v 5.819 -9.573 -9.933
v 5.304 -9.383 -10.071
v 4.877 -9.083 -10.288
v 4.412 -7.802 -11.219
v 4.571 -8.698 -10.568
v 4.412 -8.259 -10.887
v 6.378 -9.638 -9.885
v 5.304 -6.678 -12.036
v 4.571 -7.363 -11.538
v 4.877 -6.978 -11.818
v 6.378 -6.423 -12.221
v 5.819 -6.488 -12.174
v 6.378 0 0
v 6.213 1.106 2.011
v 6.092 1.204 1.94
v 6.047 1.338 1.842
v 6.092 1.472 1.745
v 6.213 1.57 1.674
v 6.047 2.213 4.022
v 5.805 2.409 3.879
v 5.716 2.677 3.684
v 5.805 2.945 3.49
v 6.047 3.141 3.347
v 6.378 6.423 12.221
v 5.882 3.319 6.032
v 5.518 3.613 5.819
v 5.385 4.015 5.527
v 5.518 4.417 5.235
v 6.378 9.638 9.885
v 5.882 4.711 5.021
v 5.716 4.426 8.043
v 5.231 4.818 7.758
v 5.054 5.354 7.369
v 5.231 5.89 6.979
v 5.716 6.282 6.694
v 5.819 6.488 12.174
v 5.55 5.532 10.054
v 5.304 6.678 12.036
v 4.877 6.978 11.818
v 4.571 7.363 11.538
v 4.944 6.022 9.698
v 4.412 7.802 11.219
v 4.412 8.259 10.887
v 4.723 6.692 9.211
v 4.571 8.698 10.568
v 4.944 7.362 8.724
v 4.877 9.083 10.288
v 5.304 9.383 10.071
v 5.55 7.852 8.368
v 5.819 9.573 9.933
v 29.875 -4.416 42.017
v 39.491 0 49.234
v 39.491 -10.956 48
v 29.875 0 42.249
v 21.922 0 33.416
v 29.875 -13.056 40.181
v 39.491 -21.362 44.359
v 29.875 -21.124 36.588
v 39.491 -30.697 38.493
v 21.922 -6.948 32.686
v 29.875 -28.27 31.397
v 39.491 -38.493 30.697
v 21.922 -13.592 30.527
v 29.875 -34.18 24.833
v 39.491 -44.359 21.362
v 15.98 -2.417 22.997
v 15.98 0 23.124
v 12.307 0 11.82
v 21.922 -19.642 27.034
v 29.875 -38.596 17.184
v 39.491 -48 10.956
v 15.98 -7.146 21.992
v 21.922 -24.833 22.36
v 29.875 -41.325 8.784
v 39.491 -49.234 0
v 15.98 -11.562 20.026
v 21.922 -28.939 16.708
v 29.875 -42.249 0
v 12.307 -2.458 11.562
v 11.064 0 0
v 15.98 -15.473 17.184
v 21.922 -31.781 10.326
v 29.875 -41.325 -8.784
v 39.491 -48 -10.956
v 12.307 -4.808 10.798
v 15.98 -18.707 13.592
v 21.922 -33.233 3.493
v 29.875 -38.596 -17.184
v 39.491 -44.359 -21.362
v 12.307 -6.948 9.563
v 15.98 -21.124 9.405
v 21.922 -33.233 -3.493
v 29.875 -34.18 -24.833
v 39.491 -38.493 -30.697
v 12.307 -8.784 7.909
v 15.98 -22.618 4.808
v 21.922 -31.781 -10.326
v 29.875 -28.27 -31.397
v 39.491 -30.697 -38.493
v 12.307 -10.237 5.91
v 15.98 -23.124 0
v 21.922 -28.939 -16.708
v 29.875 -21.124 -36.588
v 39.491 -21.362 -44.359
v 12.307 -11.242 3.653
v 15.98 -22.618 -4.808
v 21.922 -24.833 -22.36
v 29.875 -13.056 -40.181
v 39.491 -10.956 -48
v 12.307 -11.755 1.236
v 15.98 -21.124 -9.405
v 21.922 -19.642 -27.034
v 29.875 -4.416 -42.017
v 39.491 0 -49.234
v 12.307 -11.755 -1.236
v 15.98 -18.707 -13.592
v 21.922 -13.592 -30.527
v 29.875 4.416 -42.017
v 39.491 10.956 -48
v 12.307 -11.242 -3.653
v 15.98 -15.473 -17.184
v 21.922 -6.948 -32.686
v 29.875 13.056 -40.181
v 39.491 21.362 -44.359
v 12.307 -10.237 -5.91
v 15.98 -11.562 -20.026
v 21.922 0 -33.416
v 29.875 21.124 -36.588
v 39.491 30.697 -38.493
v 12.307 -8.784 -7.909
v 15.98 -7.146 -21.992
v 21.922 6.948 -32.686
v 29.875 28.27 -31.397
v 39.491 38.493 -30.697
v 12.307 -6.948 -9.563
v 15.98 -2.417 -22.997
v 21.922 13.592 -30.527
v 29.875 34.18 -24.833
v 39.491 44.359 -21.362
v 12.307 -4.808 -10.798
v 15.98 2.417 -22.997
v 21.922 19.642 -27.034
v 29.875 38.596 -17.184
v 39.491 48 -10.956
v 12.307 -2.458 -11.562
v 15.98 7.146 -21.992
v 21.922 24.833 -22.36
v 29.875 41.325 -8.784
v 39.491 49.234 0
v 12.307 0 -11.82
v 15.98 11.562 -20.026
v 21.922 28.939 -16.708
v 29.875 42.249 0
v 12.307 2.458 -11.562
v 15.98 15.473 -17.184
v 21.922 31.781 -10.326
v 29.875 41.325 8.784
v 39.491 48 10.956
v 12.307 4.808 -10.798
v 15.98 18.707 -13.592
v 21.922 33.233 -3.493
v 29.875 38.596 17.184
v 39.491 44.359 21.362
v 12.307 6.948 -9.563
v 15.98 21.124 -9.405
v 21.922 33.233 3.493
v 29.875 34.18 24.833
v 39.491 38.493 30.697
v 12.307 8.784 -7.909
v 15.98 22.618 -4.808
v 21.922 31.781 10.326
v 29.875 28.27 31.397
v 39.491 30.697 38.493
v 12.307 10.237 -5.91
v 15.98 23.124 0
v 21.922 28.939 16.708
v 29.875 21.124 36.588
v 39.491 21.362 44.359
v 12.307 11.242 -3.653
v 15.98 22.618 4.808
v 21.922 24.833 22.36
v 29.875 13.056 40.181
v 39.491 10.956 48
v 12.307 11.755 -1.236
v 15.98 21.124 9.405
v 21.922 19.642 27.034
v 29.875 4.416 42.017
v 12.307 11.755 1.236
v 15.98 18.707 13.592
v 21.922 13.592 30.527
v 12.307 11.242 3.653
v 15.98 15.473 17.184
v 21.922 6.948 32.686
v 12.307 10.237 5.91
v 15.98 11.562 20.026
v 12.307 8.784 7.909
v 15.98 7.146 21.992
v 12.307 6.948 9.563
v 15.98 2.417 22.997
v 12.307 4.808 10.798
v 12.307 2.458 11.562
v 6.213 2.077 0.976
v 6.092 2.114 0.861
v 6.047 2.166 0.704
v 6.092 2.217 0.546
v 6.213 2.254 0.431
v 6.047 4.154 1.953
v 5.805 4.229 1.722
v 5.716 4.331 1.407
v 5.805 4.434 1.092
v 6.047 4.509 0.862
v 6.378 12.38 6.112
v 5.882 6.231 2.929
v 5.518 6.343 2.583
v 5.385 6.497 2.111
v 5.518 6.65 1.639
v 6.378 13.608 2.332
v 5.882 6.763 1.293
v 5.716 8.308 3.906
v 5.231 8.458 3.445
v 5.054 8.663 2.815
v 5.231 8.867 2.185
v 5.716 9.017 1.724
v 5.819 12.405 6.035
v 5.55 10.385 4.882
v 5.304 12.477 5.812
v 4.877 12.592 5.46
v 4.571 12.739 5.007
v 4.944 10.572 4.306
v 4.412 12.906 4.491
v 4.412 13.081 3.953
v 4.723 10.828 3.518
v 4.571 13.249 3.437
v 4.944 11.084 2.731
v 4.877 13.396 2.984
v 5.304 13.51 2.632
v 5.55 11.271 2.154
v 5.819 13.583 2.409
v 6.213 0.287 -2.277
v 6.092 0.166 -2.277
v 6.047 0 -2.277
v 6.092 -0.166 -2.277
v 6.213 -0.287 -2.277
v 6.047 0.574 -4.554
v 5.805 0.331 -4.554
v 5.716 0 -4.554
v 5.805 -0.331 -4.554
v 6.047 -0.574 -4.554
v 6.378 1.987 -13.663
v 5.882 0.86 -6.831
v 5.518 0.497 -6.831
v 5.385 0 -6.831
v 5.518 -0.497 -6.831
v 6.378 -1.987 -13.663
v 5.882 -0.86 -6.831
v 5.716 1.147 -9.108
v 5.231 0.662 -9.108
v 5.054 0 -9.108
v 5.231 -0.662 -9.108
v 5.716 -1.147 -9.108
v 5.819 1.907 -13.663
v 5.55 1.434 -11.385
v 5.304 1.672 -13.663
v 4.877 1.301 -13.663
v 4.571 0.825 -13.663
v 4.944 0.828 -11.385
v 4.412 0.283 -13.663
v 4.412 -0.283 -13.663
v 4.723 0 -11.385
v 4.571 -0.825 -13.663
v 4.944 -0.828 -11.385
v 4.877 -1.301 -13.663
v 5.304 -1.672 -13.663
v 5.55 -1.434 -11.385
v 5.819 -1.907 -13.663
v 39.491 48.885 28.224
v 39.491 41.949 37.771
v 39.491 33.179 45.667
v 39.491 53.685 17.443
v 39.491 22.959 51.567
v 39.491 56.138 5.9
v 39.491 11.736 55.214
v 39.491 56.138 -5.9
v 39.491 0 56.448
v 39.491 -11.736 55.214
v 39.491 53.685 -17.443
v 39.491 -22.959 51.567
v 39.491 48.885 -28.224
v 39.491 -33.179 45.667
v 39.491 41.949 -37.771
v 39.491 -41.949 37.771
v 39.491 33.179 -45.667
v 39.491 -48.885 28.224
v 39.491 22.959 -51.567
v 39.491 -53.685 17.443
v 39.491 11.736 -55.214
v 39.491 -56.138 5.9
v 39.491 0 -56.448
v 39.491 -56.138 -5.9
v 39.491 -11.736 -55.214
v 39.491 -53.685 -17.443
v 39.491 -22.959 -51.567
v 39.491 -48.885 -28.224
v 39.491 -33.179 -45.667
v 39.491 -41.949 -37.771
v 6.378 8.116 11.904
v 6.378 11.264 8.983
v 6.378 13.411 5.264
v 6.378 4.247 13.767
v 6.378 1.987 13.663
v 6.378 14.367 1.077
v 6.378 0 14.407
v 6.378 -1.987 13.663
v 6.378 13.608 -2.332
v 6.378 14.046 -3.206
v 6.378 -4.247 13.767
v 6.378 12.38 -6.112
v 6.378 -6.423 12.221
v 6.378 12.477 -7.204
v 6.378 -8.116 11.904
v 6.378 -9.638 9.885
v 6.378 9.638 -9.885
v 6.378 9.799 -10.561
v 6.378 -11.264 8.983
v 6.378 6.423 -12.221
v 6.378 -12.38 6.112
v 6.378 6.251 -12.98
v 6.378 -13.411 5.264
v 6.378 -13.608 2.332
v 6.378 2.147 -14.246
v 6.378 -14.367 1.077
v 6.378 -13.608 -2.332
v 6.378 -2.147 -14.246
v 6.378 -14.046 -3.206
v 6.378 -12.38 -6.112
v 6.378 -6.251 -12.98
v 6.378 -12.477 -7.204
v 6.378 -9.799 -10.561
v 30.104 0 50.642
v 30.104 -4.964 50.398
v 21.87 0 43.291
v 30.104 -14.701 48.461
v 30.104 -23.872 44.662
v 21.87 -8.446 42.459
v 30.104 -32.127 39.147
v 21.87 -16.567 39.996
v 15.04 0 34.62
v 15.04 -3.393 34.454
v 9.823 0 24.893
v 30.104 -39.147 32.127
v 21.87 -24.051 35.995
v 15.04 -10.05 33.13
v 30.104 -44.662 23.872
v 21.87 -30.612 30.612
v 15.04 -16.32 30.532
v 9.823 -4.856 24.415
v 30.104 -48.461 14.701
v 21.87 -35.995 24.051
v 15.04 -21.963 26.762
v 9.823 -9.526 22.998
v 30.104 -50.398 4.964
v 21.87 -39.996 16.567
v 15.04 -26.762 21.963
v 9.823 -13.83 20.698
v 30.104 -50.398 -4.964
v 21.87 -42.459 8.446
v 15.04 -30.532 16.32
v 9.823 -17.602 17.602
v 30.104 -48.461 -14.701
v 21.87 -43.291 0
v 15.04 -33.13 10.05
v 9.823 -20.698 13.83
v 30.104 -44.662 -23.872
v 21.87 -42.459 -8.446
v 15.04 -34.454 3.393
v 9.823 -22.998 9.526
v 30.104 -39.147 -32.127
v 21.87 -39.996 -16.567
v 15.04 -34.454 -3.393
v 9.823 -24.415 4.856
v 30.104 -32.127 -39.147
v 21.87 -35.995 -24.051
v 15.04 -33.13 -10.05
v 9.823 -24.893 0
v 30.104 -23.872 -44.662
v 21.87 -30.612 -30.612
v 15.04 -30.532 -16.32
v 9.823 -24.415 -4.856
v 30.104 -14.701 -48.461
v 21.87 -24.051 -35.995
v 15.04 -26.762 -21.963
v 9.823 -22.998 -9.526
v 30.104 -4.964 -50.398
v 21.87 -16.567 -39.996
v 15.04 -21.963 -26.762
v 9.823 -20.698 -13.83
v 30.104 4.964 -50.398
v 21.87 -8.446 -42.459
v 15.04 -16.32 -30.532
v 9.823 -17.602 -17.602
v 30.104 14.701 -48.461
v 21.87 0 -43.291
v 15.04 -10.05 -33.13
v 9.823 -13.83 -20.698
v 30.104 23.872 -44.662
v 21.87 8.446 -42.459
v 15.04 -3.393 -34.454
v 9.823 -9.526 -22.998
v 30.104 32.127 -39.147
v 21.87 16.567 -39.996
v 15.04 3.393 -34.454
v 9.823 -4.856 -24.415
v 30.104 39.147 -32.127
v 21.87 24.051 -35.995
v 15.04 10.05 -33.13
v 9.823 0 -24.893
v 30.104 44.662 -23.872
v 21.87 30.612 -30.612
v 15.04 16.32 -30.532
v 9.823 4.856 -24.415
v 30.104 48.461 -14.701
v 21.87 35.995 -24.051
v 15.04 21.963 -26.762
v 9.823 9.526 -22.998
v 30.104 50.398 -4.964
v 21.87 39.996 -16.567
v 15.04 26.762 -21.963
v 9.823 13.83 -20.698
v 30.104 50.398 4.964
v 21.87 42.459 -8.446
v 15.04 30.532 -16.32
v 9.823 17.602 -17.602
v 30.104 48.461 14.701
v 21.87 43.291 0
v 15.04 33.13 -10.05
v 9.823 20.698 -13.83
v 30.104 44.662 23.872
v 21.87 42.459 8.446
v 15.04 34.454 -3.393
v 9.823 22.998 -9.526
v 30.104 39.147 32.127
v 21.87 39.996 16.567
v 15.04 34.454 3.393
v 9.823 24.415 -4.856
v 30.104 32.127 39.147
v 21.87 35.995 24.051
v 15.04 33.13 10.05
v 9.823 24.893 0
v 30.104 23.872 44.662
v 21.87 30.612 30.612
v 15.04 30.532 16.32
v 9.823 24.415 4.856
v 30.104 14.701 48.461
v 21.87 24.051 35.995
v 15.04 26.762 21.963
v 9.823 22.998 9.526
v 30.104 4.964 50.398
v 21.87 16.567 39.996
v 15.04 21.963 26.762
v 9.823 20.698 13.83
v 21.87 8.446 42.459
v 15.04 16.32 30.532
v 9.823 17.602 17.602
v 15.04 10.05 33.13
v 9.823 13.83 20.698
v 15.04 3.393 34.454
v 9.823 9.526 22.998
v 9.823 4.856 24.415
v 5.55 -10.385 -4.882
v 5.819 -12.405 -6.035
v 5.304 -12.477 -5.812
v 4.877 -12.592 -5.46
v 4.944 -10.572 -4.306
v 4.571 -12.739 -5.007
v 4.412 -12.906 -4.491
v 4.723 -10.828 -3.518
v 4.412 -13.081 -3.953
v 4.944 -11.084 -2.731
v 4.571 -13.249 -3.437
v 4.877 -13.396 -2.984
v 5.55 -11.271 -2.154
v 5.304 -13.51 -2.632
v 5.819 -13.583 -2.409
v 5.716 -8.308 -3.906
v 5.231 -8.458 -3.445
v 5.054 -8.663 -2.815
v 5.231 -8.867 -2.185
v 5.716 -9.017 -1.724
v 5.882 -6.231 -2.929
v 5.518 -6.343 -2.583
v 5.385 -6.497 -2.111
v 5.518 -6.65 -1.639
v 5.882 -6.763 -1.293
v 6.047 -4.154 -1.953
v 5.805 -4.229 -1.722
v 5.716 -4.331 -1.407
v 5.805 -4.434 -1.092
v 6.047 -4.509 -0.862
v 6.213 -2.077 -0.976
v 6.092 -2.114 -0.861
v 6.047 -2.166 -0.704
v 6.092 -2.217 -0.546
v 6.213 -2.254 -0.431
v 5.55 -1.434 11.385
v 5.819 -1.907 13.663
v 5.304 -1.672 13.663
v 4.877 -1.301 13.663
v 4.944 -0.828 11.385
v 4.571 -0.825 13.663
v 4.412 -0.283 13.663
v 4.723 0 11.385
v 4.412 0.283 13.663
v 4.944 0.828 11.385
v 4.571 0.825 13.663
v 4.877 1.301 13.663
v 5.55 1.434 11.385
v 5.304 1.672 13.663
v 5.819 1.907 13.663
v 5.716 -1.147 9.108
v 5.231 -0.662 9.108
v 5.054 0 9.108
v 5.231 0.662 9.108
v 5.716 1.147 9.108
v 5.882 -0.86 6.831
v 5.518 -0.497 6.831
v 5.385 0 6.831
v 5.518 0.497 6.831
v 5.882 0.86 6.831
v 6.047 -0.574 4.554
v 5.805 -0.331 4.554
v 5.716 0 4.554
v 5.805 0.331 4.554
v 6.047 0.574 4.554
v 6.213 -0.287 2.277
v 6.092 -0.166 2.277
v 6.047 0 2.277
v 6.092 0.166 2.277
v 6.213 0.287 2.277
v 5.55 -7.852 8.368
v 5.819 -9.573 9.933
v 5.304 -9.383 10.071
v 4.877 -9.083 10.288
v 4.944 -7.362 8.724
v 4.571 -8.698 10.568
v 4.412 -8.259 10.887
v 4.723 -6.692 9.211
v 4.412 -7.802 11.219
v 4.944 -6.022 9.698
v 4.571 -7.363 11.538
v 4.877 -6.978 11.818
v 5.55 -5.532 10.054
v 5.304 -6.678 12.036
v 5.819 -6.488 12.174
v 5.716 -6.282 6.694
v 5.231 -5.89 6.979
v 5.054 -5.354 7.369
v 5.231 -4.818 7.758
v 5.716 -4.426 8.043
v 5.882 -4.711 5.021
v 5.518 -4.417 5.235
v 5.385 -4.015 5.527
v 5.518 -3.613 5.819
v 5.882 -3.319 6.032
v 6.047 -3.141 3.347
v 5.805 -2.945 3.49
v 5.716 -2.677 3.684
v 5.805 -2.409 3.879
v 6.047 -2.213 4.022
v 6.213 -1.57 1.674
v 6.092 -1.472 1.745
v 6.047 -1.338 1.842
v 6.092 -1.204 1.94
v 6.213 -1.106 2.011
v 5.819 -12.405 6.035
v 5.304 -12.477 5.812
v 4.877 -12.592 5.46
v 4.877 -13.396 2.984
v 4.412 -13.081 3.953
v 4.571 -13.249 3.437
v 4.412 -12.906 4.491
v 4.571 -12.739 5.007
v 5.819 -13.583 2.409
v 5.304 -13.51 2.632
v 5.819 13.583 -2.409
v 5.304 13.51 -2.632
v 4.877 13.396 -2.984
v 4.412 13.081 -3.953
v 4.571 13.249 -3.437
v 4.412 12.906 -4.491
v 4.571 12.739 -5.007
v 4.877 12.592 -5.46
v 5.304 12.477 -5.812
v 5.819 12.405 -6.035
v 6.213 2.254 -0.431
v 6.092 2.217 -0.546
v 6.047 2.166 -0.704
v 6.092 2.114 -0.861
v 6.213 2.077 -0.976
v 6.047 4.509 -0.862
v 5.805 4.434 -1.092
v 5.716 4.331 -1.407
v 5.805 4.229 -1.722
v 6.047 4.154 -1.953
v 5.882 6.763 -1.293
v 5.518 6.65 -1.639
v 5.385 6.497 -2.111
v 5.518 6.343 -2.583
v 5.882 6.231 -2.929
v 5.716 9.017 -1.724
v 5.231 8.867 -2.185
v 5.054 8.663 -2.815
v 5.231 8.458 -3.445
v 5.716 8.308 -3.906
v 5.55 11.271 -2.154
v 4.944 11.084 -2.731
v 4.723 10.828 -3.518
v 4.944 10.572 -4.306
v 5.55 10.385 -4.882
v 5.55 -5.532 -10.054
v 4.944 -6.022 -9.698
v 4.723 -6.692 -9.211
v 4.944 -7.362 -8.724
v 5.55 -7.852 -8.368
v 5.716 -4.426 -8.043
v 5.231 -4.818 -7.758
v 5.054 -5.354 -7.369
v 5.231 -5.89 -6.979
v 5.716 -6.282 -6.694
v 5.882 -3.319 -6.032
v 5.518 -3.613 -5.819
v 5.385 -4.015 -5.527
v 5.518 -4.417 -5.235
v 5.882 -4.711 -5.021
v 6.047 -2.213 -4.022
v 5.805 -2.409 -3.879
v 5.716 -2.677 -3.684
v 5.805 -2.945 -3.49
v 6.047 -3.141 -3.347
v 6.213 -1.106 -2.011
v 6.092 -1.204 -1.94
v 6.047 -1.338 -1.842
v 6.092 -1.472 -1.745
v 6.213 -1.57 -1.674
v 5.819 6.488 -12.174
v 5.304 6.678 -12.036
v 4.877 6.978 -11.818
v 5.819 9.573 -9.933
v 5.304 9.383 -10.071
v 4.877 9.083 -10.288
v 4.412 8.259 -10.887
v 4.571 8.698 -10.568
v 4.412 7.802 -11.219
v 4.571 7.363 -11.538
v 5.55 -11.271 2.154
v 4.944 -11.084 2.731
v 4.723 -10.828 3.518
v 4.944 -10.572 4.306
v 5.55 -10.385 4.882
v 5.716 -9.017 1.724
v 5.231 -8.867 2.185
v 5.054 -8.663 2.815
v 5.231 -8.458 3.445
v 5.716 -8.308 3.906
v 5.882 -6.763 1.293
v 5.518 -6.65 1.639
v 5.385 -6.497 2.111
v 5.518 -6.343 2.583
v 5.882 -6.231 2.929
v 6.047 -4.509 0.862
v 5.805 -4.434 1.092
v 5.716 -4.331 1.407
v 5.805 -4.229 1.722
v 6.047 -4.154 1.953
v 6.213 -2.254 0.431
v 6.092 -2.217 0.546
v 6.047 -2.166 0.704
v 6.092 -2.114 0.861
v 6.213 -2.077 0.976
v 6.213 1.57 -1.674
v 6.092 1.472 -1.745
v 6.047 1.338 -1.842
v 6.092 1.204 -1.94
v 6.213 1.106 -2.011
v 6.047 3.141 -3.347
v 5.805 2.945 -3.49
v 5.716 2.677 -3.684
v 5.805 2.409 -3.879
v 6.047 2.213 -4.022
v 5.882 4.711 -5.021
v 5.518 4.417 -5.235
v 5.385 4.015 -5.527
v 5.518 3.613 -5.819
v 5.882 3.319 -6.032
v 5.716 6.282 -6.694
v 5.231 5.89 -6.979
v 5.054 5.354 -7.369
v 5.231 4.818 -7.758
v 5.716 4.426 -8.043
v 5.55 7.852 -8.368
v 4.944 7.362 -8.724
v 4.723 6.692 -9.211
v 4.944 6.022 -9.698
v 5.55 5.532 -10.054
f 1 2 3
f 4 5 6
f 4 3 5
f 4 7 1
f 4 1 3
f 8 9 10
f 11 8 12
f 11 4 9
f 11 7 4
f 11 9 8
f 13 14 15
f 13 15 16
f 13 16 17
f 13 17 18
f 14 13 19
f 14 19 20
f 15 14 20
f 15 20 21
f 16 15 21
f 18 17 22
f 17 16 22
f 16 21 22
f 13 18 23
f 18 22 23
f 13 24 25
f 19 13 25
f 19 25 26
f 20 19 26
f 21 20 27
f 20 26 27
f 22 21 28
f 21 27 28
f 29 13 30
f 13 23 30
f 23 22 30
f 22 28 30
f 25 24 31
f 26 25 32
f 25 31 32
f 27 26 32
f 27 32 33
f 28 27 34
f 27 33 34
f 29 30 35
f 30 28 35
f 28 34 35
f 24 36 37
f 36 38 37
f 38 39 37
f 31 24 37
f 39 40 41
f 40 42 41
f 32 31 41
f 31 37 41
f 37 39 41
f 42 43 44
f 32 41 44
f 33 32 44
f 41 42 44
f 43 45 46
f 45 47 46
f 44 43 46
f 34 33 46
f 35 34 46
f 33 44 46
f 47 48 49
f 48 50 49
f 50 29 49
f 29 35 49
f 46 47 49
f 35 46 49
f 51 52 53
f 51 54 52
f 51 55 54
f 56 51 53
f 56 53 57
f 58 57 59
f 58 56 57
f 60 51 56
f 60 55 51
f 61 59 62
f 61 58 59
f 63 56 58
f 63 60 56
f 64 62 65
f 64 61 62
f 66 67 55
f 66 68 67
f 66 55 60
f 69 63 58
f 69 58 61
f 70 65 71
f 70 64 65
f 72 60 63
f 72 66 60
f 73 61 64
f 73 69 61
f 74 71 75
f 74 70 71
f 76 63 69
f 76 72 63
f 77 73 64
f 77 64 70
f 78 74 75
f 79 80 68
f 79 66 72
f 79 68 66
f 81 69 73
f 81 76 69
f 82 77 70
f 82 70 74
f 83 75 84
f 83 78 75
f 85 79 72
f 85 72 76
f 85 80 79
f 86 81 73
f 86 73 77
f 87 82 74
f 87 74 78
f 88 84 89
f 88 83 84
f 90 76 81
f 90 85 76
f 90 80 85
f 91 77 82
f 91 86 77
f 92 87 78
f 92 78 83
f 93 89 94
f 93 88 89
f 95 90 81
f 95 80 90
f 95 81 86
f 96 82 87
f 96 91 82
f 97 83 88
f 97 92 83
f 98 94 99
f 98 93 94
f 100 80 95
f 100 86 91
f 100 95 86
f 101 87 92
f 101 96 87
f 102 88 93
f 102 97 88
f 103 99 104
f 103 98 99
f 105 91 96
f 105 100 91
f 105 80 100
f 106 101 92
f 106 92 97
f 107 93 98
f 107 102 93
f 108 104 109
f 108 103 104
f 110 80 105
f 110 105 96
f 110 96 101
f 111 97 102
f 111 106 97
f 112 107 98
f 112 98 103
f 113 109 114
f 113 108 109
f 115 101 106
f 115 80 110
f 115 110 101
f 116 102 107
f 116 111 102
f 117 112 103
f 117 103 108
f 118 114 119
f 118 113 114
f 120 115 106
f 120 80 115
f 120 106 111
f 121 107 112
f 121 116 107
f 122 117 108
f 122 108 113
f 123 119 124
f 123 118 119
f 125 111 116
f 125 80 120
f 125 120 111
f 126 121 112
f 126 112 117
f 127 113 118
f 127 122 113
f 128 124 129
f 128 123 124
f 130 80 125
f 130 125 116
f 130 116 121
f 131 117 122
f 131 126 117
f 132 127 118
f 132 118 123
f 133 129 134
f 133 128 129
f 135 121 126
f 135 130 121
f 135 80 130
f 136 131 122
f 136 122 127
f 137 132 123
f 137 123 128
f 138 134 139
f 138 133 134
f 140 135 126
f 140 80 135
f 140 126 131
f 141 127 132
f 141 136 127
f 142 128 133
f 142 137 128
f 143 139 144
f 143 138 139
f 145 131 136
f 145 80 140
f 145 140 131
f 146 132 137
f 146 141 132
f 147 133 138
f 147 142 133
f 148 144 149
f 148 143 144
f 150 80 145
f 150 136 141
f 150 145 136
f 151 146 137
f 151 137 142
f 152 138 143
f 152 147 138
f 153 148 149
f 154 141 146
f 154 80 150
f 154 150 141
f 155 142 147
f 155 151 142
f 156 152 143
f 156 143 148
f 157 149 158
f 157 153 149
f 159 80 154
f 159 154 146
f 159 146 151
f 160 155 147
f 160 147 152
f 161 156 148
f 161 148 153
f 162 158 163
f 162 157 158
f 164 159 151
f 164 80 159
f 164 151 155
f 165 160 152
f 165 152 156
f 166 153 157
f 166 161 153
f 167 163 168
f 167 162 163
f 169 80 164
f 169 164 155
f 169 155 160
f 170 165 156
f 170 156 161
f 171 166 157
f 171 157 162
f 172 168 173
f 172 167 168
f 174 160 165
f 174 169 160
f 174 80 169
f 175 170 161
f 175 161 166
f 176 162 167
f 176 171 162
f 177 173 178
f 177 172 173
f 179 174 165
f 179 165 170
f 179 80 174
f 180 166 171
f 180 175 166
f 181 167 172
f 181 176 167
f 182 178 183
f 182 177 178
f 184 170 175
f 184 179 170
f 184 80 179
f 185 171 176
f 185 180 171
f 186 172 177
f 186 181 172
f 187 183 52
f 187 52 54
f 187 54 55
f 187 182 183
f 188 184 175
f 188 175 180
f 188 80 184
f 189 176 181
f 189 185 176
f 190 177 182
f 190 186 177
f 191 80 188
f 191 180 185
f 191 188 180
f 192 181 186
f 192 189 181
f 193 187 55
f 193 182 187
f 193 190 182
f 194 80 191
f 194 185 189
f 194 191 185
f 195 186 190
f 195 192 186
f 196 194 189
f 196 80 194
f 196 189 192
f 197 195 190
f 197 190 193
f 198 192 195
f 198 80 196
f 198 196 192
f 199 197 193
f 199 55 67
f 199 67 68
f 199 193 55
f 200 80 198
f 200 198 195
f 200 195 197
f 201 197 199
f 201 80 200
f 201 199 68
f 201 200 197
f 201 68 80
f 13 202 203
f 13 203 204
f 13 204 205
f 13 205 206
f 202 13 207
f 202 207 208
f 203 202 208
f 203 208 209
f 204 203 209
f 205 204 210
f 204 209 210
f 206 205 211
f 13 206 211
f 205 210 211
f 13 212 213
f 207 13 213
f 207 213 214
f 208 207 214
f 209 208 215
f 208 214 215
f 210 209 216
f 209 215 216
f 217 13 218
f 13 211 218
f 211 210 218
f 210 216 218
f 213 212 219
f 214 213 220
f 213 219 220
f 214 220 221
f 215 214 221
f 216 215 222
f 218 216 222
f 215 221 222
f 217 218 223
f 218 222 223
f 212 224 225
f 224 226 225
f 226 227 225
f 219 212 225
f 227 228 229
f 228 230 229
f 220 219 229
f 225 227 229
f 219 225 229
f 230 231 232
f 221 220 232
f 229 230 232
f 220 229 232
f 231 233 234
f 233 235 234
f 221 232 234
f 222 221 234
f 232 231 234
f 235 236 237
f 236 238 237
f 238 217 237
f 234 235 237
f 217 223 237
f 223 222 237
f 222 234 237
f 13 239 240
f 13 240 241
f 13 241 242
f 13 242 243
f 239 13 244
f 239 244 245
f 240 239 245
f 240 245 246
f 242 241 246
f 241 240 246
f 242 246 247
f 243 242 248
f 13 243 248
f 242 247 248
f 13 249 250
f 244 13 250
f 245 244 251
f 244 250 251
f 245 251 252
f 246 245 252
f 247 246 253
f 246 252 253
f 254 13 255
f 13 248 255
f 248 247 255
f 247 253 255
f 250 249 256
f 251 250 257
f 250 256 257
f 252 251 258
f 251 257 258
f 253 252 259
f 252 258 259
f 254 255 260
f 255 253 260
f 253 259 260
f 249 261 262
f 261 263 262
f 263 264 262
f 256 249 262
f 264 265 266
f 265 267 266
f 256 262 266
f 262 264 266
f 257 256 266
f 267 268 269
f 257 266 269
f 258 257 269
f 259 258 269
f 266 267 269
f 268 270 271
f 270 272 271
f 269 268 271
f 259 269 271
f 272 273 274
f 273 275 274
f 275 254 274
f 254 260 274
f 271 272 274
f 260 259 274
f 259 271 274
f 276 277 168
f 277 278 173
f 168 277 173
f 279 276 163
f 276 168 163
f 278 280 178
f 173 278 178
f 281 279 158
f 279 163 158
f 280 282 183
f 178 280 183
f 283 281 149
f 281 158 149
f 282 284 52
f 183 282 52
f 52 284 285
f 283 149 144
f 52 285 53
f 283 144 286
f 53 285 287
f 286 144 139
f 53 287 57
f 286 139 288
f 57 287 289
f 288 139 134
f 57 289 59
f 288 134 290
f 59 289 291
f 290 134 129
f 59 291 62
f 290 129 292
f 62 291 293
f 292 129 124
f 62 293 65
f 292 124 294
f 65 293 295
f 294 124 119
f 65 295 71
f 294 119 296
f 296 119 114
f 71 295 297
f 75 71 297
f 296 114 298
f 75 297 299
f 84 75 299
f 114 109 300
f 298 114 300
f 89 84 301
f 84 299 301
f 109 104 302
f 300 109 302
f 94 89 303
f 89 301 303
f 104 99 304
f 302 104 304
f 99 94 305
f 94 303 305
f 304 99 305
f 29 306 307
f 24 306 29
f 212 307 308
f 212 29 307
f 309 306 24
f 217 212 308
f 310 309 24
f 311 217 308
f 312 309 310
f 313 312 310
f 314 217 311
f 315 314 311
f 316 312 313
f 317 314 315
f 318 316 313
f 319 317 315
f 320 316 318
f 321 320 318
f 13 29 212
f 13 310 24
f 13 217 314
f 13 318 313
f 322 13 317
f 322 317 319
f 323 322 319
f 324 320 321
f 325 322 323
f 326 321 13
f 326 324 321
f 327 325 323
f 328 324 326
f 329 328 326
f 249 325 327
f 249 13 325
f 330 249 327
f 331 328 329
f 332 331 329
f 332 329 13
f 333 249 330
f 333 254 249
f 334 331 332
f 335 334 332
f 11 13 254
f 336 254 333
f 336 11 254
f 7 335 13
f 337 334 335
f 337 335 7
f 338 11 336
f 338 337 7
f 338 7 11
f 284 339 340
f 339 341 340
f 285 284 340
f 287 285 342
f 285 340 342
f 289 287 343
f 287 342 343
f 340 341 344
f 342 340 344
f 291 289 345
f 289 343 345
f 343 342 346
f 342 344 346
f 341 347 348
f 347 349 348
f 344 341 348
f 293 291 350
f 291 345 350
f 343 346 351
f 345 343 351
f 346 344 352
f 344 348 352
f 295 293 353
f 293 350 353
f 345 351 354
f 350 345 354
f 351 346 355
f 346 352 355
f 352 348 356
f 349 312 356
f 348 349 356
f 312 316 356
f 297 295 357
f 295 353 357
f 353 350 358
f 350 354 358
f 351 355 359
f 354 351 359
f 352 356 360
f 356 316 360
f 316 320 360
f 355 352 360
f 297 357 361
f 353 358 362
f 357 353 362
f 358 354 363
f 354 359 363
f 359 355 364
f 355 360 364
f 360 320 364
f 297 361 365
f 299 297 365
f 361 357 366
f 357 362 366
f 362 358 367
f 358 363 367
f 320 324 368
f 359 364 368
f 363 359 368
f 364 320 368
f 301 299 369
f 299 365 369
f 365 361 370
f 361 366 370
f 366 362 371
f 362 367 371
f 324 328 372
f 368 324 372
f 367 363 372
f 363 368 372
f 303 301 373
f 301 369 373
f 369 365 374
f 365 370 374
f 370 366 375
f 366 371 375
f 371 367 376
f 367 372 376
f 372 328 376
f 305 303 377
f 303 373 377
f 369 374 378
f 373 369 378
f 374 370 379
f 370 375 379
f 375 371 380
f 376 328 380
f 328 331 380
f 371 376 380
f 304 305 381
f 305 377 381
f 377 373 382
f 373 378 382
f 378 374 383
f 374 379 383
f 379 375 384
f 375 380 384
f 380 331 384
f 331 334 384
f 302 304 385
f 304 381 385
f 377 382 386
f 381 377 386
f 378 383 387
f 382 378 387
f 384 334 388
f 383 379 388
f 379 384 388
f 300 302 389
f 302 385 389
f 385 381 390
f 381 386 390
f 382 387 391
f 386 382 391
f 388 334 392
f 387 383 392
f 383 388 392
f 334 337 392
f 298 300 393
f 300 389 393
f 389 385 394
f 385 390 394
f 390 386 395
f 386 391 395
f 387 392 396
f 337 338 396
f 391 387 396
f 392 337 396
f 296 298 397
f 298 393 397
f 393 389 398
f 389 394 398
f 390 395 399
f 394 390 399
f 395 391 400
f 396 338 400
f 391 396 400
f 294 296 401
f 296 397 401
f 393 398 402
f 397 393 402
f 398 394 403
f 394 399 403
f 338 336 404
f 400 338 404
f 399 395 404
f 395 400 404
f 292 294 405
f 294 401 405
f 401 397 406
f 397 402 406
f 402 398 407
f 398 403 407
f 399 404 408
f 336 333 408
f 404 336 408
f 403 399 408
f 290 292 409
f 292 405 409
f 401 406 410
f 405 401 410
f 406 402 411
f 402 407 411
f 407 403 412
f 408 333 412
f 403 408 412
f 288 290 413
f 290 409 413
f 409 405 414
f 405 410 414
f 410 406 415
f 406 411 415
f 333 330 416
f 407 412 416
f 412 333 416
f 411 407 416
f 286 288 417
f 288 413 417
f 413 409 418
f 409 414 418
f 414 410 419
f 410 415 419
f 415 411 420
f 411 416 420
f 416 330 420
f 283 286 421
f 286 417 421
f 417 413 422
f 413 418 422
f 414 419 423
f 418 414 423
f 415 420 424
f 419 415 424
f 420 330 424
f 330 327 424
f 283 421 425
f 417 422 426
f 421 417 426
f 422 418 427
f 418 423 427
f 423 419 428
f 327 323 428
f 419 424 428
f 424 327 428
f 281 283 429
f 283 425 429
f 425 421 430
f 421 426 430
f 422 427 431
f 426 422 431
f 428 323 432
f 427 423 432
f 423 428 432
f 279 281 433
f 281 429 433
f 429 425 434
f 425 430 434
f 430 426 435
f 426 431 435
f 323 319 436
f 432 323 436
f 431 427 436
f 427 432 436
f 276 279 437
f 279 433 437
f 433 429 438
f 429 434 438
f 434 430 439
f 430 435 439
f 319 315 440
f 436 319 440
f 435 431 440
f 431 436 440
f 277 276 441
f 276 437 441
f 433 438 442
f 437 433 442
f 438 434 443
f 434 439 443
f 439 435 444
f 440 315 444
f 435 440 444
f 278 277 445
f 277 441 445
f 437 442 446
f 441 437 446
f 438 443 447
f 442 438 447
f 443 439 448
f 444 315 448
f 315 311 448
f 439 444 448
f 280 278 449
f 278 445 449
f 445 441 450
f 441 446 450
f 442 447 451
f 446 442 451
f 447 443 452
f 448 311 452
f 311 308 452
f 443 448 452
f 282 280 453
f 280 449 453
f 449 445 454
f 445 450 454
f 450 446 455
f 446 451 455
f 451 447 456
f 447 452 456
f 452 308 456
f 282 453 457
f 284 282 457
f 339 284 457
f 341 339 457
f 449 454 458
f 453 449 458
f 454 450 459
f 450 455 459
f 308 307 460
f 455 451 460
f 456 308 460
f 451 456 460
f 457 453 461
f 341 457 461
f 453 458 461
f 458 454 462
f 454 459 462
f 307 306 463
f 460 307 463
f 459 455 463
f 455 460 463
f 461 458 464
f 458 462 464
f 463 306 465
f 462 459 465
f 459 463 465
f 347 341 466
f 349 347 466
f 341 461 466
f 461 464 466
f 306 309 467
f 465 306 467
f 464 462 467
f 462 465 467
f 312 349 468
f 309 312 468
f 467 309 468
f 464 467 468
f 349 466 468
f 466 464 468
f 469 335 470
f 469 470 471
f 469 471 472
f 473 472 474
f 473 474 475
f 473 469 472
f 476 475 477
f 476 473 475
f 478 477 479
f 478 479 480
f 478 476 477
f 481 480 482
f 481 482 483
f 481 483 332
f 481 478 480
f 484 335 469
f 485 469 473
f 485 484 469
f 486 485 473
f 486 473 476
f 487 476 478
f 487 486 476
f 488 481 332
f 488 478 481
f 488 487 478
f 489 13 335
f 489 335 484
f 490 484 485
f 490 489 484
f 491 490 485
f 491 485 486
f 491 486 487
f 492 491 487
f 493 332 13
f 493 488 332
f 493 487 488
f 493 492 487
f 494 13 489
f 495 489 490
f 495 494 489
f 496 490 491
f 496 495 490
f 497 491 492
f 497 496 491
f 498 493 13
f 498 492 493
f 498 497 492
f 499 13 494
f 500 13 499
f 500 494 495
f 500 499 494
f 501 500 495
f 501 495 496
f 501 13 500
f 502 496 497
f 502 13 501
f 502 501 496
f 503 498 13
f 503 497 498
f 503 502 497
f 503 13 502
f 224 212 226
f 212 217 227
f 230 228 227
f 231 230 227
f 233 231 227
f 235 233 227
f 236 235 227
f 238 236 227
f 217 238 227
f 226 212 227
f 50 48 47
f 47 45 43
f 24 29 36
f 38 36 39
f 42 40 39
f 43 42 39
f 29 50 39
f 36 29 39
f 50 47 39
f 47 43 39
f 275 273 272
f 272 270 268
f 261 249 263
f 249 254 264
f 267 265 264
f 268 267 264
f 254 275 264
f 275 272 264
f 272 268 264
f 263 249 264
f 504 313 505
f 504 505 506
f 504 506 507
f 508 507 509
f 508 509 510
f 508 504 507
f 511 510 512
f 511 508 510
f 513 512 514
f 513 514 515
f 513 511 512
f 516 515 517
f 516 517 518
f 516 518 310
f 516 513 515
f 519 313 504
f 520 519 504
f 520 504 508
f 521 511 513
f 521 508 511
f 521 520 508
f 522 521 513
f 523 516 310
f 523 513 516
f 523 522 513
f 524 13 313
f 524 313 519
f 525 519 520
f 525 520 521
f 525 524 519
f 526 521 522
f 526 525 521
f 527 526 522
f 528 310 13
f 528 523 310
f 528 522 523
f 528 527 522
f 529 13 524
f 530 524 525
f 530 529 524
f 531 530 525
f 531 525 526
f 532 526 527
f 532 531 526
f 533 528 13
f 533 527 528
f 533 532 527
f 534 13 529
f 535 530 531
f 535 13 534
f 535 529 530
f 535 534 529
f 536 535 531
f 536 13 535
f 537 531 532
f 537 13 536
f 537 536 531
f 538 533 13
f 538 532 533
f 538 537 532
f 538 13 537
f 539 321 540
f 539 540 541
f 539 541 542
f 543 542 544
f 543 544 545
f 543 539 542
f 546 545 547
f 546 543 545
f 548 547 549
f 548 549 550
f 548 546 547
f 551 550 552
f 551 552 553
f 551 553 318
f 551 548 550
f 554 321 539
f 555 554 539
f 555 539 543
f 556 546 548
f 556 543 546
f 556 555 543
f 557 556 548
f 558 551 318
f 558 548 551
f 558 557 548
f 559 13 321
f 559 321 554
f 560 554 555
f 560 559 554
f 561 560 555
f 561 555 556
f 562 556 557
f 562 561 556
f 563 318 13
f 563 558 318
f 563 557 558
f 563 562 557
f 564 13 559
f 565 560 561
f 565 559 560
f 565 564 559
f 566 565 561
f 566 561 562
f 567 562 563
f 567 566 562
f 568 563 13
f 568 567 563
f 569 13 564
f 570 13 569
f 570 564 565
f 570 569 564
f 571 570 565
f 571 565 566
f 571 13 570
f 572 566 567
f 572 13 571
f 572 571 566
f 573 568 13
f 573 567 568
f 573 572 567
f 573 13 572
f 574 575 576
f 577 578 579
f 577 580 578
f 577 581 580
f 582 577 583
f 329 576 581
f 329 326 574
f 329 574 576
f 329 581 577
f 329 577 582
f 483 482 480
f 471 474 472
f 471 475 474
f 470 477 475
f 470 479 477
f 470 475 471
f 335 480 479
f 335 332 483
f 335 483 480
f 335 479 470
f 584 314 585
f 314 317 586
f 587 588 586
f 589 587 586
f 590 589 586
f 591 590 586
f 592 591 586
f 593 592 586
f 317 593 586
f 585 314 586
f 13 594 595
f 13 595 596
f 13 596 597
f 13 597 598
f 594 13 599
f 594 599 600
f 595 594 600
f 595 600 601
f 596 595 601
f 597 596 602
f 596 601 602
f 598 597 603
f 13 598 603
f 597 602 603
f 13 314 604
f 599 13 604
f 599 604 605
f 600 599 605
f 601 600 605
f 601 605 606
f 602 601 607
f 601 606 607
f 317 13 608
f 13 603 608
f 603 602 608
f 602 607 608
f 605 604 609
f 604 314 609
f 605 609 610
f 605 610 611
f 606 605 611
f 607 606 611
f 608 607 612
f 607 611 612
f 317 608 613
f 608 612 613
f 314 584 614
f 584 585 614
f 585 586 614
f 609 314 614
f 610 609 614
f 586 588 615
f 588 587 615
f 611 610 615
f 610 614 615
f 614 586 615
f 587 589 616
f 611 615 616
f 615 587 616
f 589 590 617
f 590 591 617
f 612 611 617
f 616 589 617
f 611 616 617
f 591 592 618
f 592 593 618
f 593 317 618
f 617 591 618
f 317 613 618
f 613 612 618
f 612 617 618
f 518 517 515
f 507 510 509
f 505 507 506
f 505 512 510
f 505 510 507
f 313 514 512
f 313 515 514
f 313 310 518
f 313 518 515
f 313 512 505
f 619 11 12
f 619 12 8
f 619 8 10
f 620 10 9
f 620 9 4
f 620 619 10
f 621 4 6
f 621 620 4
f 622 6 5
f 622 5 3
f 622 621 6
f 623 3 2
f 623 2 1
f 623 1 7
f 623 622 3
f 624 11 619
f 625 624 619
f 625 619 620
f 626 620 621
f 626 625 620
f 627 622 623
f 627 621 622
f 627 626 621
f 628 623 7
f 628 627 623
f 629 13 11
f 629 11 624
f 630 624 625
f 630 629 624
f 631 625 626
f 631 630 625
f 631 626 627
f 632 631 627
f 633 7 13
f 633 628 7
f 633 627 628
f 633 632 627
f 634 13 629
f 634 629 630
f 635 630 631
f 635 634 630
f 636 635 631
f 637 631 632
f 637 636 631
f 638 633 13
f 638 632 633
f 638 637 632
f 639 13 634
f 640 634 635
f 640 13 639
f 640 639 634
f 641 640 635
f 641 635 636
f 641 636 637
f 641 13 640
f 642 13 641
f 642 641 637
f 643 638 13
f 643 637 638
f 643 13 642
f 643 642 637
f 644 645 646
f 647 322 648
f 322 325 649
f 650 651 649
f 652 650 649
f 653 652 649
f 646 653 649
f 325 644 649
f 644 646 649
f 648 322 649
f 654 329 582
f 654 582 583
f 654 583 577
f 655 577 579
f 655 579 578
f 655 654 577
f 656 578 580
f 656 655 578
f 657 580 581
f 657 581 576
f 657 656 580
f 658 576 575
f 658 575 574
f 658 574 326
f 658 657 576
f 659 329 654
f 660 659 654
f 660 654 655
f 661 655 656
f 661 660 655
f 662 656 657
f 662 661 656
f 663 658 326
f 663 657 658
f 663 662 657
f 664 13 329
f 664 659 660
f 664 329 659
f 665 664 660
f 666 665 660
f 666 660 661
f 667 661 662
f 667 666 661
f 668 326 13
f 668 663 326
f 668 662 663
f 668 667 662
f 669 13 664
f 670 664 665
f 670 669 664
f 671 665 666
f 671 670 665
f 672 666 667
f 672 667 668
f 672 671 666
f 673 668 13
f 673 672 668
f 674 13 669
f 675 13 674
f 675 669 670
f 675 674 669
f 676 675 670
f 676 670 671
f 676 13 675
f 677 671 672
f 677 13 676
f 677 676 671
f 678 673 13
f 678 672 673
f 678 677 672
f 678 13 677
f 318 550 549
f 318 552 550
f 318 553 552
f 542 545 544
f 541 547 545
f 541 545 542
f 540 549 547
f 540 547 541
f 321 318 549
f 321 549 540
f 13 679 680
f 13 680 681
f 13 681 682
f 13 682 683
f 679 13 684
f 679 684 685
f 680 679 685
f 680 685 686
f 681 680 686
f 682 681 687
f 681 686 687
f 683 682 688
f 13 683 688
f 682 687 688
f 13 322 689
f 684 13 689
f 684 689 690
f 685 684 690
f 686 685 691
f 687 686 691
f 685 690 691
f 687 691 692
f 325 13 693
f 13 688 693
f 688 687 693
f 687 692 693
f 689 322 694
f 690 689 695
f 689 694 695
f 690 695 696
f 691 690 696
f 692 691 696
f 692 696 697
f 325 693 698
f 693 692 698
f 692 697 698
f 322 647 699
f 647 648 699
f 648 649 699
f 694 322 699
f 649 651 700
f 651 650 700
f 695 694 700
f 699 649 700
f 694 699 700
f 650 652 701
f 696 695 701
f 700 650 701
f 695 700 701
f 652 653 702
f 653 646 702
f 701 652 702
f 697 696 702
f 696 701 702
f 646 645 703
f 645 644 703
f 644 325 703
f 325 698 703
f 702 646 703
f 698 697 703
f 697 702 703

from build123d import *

# Parameters (mm, degrees)
F2_T = -6.35
F3_W = 12.7568915486
F3_H = 15.9924589097


# Not quite as in the source:
# - a feature names something its author has since deleted; it is built from what else it names


with BuildPart() as f1:
    # F0 (on Front) → F1 (revolve)
    with BuildSketch(Plane.XZ):
        with BuildLine():
            Line((39.4908925979, 0), (39.4908925979, 56.4475917369))
            ThreePointArc((39.4908925979, 56.4475917369), (14.1063703184, 33.1501751178), (4.71438, 0))
            Line((4.71438, 0), (39.4908925979, 0))
        make_face()
    revolve(axis=Axis((0, 0, 0), (1, 0, 0)))

    # F2
    f2_openings = [f1.faces().sort_by_distance(p)[0] for p in [
        (39.490893, 0, 0),
    ]]
    offset(amount=F2_T, openings=f2_openings)

    # F3 (on Front) → F4 (revolve, cut)
    with BuildSketch(Plane.XZ):
        with Locations((0, 7.9962294549)):
            Rectangle(F3_W, F3_H)
    revolve(axis=Axis((0, 0, 0), (1, 0, 0)), mode=Mode.SUBTRACT)

    # F5 (on face) → F6 (revolve)
    with BuildSketch(Plane(origin=(6.3784457743, 0, 0), x_dir=(0, -1, 0), z_dir=(-1, 0, 0))):
        Polygon((-1.9871168115, 13.66252359), (0, 0), (0, 13.66252359), align=None)
    revolve(axis=Axis((6.3784457743, 0, 6.831261795), (0, 0, -1)))

    # F5 (on face) → F7 (revolve)
    with BuildSketch(Plane(origin=(6.3784457743, 0, 0), x_dir=(0, -1, 0), z_dir=(-1, 0, 0))):
        Polygon((-8.0306298753, 11.0532137704), (0, 0), (-6.423018605, 12.2212117268), align=None)
    revolve(axis=Axis((6.3784457743, 4.0153149377, 5.5266068852), (0, -0.5877852523, -0.8090169944)))

    # F5 (on face) → F8 (revolve)
    with BuildSketch(Plane(origin=(6.3784457743, 0, 0), x_dir=(0, -1, 0), z_dir=(-1, 0, 0))):
        Polygon((-12.9938320893, 4.2219519754), (0, 0), (-12.3797792248, 6.1118123676), align=None)
    revolve(axis=Axis((6.3784457743, 6.4969160447, 2.1109759877), (0, -0.9510565163, -0.3090169944)))

    # F5 (on face) → F9 (revolve)
    with BuildSketch(Plane(origin=(6.3784457743, 0, 0), x_dir=(0, -1, 0), z_dir=(-1, 0, 0))):
        Polygon((-12.9938320893, -4.2219519754), (0, 0), (-13.6078849539, -2.3320915832), align=None)
    revolve(axis=Axis((6.3784457743, 6.4969160447, -2.1109759877), (0, -0.9510565163, 0.3090169944)))

    # F5 (on face) → F10 (revolve)
    with BuildSketch(Plane(origin=(6.3784457743, 0, 0), x_dir=(0, -1, 0), z_dir=(-1, 0, 0))):
        Polygon((-8.0306298753, -11.0532137704), (0, 0), (-9.6382411456, -9.885215814), align=None)
    revolve(axis=Axis((6.3784457743, 4.0153149377, -5.5266068852), (0, -0.5877852523, 0.8090169944)))

    # F5 (on face) → F11 (revolve)
    with BuildSketch(Plane(origin=(6.3784457743, 0, 0), x_dir=(0, -1, 0), z_dir=(-1, 0, 0))):
        Polygon((0, -13.66252359), (0, 0), (-1.9871168115, -13.66252359), align=None)
    revolve(axis=Axis((6.3784457743, 0, -6.831261795), (0, 0, 1)))

    # F5 (on face) → F12 (revolve)
    with BuildSketch(Plane(origin=(6.3784457743, 0, 0), x_dir=(0, -1, 0), z_dir=(-1, 0, 0))):
        Polygon((6.423018605, 12.2212117268), (0, 0), (8.0306298753, 11.0532137704), align=None)
    revolve(axis=Axis((6.3784457743, -4.0153149377, 5.5266068852), (0, 0.5877852523, -0.8090169944)))

    # F5 (on face) → F13 (revolve)
    with BuildSketch(Plane(origin=(6.3784457743, 0, 0), x_dir=(0, -1, 0), z_dir=(-1, 0, 0))):
        Polygon((12.3797792248, 6.1118123676), (0, 0), (12.9938320893, 4.2219519754), align=None)
    revolve(axis=Axis((6.3784457743, -6.4969160447, 2.1109759877), (0, 0.9510565163, -0.3090169944)))

    # F5 (on face) → F14 (revolve)
    with BuildSketch(Plane(origin=(6.3784457743, 0, 0), x_dir=(0, -1, 0), z_dir=(-1, 0, 0))):
        Polygon((13.6078849539, -2.3320915832), (0, 0), (12.9938320893, -4.2219519754), align=None)
    revolve(axis=Axis((6.3784457743, -6.4969160447, -2.1109759877), (0, 0.9510565163, 0.3090169944)))

    # F5 (on face) → F15 (revolve)
    with BuildSketch(Plane(origin=(6.3784457743, 0, 0), x_dir=(0, -1, 0), z_dir=(-1, 0, 0))):
        Polygon((9.6382411456, -9.885215814), (0, 0), (8.0306298753, -11.0532137704), align=None)
    revolve(axis=Axis((6.3784457743, -4.0153149377, -5.5266068852), (0, 0.5877852523, 0.8090169944)))


solid = f1.part
